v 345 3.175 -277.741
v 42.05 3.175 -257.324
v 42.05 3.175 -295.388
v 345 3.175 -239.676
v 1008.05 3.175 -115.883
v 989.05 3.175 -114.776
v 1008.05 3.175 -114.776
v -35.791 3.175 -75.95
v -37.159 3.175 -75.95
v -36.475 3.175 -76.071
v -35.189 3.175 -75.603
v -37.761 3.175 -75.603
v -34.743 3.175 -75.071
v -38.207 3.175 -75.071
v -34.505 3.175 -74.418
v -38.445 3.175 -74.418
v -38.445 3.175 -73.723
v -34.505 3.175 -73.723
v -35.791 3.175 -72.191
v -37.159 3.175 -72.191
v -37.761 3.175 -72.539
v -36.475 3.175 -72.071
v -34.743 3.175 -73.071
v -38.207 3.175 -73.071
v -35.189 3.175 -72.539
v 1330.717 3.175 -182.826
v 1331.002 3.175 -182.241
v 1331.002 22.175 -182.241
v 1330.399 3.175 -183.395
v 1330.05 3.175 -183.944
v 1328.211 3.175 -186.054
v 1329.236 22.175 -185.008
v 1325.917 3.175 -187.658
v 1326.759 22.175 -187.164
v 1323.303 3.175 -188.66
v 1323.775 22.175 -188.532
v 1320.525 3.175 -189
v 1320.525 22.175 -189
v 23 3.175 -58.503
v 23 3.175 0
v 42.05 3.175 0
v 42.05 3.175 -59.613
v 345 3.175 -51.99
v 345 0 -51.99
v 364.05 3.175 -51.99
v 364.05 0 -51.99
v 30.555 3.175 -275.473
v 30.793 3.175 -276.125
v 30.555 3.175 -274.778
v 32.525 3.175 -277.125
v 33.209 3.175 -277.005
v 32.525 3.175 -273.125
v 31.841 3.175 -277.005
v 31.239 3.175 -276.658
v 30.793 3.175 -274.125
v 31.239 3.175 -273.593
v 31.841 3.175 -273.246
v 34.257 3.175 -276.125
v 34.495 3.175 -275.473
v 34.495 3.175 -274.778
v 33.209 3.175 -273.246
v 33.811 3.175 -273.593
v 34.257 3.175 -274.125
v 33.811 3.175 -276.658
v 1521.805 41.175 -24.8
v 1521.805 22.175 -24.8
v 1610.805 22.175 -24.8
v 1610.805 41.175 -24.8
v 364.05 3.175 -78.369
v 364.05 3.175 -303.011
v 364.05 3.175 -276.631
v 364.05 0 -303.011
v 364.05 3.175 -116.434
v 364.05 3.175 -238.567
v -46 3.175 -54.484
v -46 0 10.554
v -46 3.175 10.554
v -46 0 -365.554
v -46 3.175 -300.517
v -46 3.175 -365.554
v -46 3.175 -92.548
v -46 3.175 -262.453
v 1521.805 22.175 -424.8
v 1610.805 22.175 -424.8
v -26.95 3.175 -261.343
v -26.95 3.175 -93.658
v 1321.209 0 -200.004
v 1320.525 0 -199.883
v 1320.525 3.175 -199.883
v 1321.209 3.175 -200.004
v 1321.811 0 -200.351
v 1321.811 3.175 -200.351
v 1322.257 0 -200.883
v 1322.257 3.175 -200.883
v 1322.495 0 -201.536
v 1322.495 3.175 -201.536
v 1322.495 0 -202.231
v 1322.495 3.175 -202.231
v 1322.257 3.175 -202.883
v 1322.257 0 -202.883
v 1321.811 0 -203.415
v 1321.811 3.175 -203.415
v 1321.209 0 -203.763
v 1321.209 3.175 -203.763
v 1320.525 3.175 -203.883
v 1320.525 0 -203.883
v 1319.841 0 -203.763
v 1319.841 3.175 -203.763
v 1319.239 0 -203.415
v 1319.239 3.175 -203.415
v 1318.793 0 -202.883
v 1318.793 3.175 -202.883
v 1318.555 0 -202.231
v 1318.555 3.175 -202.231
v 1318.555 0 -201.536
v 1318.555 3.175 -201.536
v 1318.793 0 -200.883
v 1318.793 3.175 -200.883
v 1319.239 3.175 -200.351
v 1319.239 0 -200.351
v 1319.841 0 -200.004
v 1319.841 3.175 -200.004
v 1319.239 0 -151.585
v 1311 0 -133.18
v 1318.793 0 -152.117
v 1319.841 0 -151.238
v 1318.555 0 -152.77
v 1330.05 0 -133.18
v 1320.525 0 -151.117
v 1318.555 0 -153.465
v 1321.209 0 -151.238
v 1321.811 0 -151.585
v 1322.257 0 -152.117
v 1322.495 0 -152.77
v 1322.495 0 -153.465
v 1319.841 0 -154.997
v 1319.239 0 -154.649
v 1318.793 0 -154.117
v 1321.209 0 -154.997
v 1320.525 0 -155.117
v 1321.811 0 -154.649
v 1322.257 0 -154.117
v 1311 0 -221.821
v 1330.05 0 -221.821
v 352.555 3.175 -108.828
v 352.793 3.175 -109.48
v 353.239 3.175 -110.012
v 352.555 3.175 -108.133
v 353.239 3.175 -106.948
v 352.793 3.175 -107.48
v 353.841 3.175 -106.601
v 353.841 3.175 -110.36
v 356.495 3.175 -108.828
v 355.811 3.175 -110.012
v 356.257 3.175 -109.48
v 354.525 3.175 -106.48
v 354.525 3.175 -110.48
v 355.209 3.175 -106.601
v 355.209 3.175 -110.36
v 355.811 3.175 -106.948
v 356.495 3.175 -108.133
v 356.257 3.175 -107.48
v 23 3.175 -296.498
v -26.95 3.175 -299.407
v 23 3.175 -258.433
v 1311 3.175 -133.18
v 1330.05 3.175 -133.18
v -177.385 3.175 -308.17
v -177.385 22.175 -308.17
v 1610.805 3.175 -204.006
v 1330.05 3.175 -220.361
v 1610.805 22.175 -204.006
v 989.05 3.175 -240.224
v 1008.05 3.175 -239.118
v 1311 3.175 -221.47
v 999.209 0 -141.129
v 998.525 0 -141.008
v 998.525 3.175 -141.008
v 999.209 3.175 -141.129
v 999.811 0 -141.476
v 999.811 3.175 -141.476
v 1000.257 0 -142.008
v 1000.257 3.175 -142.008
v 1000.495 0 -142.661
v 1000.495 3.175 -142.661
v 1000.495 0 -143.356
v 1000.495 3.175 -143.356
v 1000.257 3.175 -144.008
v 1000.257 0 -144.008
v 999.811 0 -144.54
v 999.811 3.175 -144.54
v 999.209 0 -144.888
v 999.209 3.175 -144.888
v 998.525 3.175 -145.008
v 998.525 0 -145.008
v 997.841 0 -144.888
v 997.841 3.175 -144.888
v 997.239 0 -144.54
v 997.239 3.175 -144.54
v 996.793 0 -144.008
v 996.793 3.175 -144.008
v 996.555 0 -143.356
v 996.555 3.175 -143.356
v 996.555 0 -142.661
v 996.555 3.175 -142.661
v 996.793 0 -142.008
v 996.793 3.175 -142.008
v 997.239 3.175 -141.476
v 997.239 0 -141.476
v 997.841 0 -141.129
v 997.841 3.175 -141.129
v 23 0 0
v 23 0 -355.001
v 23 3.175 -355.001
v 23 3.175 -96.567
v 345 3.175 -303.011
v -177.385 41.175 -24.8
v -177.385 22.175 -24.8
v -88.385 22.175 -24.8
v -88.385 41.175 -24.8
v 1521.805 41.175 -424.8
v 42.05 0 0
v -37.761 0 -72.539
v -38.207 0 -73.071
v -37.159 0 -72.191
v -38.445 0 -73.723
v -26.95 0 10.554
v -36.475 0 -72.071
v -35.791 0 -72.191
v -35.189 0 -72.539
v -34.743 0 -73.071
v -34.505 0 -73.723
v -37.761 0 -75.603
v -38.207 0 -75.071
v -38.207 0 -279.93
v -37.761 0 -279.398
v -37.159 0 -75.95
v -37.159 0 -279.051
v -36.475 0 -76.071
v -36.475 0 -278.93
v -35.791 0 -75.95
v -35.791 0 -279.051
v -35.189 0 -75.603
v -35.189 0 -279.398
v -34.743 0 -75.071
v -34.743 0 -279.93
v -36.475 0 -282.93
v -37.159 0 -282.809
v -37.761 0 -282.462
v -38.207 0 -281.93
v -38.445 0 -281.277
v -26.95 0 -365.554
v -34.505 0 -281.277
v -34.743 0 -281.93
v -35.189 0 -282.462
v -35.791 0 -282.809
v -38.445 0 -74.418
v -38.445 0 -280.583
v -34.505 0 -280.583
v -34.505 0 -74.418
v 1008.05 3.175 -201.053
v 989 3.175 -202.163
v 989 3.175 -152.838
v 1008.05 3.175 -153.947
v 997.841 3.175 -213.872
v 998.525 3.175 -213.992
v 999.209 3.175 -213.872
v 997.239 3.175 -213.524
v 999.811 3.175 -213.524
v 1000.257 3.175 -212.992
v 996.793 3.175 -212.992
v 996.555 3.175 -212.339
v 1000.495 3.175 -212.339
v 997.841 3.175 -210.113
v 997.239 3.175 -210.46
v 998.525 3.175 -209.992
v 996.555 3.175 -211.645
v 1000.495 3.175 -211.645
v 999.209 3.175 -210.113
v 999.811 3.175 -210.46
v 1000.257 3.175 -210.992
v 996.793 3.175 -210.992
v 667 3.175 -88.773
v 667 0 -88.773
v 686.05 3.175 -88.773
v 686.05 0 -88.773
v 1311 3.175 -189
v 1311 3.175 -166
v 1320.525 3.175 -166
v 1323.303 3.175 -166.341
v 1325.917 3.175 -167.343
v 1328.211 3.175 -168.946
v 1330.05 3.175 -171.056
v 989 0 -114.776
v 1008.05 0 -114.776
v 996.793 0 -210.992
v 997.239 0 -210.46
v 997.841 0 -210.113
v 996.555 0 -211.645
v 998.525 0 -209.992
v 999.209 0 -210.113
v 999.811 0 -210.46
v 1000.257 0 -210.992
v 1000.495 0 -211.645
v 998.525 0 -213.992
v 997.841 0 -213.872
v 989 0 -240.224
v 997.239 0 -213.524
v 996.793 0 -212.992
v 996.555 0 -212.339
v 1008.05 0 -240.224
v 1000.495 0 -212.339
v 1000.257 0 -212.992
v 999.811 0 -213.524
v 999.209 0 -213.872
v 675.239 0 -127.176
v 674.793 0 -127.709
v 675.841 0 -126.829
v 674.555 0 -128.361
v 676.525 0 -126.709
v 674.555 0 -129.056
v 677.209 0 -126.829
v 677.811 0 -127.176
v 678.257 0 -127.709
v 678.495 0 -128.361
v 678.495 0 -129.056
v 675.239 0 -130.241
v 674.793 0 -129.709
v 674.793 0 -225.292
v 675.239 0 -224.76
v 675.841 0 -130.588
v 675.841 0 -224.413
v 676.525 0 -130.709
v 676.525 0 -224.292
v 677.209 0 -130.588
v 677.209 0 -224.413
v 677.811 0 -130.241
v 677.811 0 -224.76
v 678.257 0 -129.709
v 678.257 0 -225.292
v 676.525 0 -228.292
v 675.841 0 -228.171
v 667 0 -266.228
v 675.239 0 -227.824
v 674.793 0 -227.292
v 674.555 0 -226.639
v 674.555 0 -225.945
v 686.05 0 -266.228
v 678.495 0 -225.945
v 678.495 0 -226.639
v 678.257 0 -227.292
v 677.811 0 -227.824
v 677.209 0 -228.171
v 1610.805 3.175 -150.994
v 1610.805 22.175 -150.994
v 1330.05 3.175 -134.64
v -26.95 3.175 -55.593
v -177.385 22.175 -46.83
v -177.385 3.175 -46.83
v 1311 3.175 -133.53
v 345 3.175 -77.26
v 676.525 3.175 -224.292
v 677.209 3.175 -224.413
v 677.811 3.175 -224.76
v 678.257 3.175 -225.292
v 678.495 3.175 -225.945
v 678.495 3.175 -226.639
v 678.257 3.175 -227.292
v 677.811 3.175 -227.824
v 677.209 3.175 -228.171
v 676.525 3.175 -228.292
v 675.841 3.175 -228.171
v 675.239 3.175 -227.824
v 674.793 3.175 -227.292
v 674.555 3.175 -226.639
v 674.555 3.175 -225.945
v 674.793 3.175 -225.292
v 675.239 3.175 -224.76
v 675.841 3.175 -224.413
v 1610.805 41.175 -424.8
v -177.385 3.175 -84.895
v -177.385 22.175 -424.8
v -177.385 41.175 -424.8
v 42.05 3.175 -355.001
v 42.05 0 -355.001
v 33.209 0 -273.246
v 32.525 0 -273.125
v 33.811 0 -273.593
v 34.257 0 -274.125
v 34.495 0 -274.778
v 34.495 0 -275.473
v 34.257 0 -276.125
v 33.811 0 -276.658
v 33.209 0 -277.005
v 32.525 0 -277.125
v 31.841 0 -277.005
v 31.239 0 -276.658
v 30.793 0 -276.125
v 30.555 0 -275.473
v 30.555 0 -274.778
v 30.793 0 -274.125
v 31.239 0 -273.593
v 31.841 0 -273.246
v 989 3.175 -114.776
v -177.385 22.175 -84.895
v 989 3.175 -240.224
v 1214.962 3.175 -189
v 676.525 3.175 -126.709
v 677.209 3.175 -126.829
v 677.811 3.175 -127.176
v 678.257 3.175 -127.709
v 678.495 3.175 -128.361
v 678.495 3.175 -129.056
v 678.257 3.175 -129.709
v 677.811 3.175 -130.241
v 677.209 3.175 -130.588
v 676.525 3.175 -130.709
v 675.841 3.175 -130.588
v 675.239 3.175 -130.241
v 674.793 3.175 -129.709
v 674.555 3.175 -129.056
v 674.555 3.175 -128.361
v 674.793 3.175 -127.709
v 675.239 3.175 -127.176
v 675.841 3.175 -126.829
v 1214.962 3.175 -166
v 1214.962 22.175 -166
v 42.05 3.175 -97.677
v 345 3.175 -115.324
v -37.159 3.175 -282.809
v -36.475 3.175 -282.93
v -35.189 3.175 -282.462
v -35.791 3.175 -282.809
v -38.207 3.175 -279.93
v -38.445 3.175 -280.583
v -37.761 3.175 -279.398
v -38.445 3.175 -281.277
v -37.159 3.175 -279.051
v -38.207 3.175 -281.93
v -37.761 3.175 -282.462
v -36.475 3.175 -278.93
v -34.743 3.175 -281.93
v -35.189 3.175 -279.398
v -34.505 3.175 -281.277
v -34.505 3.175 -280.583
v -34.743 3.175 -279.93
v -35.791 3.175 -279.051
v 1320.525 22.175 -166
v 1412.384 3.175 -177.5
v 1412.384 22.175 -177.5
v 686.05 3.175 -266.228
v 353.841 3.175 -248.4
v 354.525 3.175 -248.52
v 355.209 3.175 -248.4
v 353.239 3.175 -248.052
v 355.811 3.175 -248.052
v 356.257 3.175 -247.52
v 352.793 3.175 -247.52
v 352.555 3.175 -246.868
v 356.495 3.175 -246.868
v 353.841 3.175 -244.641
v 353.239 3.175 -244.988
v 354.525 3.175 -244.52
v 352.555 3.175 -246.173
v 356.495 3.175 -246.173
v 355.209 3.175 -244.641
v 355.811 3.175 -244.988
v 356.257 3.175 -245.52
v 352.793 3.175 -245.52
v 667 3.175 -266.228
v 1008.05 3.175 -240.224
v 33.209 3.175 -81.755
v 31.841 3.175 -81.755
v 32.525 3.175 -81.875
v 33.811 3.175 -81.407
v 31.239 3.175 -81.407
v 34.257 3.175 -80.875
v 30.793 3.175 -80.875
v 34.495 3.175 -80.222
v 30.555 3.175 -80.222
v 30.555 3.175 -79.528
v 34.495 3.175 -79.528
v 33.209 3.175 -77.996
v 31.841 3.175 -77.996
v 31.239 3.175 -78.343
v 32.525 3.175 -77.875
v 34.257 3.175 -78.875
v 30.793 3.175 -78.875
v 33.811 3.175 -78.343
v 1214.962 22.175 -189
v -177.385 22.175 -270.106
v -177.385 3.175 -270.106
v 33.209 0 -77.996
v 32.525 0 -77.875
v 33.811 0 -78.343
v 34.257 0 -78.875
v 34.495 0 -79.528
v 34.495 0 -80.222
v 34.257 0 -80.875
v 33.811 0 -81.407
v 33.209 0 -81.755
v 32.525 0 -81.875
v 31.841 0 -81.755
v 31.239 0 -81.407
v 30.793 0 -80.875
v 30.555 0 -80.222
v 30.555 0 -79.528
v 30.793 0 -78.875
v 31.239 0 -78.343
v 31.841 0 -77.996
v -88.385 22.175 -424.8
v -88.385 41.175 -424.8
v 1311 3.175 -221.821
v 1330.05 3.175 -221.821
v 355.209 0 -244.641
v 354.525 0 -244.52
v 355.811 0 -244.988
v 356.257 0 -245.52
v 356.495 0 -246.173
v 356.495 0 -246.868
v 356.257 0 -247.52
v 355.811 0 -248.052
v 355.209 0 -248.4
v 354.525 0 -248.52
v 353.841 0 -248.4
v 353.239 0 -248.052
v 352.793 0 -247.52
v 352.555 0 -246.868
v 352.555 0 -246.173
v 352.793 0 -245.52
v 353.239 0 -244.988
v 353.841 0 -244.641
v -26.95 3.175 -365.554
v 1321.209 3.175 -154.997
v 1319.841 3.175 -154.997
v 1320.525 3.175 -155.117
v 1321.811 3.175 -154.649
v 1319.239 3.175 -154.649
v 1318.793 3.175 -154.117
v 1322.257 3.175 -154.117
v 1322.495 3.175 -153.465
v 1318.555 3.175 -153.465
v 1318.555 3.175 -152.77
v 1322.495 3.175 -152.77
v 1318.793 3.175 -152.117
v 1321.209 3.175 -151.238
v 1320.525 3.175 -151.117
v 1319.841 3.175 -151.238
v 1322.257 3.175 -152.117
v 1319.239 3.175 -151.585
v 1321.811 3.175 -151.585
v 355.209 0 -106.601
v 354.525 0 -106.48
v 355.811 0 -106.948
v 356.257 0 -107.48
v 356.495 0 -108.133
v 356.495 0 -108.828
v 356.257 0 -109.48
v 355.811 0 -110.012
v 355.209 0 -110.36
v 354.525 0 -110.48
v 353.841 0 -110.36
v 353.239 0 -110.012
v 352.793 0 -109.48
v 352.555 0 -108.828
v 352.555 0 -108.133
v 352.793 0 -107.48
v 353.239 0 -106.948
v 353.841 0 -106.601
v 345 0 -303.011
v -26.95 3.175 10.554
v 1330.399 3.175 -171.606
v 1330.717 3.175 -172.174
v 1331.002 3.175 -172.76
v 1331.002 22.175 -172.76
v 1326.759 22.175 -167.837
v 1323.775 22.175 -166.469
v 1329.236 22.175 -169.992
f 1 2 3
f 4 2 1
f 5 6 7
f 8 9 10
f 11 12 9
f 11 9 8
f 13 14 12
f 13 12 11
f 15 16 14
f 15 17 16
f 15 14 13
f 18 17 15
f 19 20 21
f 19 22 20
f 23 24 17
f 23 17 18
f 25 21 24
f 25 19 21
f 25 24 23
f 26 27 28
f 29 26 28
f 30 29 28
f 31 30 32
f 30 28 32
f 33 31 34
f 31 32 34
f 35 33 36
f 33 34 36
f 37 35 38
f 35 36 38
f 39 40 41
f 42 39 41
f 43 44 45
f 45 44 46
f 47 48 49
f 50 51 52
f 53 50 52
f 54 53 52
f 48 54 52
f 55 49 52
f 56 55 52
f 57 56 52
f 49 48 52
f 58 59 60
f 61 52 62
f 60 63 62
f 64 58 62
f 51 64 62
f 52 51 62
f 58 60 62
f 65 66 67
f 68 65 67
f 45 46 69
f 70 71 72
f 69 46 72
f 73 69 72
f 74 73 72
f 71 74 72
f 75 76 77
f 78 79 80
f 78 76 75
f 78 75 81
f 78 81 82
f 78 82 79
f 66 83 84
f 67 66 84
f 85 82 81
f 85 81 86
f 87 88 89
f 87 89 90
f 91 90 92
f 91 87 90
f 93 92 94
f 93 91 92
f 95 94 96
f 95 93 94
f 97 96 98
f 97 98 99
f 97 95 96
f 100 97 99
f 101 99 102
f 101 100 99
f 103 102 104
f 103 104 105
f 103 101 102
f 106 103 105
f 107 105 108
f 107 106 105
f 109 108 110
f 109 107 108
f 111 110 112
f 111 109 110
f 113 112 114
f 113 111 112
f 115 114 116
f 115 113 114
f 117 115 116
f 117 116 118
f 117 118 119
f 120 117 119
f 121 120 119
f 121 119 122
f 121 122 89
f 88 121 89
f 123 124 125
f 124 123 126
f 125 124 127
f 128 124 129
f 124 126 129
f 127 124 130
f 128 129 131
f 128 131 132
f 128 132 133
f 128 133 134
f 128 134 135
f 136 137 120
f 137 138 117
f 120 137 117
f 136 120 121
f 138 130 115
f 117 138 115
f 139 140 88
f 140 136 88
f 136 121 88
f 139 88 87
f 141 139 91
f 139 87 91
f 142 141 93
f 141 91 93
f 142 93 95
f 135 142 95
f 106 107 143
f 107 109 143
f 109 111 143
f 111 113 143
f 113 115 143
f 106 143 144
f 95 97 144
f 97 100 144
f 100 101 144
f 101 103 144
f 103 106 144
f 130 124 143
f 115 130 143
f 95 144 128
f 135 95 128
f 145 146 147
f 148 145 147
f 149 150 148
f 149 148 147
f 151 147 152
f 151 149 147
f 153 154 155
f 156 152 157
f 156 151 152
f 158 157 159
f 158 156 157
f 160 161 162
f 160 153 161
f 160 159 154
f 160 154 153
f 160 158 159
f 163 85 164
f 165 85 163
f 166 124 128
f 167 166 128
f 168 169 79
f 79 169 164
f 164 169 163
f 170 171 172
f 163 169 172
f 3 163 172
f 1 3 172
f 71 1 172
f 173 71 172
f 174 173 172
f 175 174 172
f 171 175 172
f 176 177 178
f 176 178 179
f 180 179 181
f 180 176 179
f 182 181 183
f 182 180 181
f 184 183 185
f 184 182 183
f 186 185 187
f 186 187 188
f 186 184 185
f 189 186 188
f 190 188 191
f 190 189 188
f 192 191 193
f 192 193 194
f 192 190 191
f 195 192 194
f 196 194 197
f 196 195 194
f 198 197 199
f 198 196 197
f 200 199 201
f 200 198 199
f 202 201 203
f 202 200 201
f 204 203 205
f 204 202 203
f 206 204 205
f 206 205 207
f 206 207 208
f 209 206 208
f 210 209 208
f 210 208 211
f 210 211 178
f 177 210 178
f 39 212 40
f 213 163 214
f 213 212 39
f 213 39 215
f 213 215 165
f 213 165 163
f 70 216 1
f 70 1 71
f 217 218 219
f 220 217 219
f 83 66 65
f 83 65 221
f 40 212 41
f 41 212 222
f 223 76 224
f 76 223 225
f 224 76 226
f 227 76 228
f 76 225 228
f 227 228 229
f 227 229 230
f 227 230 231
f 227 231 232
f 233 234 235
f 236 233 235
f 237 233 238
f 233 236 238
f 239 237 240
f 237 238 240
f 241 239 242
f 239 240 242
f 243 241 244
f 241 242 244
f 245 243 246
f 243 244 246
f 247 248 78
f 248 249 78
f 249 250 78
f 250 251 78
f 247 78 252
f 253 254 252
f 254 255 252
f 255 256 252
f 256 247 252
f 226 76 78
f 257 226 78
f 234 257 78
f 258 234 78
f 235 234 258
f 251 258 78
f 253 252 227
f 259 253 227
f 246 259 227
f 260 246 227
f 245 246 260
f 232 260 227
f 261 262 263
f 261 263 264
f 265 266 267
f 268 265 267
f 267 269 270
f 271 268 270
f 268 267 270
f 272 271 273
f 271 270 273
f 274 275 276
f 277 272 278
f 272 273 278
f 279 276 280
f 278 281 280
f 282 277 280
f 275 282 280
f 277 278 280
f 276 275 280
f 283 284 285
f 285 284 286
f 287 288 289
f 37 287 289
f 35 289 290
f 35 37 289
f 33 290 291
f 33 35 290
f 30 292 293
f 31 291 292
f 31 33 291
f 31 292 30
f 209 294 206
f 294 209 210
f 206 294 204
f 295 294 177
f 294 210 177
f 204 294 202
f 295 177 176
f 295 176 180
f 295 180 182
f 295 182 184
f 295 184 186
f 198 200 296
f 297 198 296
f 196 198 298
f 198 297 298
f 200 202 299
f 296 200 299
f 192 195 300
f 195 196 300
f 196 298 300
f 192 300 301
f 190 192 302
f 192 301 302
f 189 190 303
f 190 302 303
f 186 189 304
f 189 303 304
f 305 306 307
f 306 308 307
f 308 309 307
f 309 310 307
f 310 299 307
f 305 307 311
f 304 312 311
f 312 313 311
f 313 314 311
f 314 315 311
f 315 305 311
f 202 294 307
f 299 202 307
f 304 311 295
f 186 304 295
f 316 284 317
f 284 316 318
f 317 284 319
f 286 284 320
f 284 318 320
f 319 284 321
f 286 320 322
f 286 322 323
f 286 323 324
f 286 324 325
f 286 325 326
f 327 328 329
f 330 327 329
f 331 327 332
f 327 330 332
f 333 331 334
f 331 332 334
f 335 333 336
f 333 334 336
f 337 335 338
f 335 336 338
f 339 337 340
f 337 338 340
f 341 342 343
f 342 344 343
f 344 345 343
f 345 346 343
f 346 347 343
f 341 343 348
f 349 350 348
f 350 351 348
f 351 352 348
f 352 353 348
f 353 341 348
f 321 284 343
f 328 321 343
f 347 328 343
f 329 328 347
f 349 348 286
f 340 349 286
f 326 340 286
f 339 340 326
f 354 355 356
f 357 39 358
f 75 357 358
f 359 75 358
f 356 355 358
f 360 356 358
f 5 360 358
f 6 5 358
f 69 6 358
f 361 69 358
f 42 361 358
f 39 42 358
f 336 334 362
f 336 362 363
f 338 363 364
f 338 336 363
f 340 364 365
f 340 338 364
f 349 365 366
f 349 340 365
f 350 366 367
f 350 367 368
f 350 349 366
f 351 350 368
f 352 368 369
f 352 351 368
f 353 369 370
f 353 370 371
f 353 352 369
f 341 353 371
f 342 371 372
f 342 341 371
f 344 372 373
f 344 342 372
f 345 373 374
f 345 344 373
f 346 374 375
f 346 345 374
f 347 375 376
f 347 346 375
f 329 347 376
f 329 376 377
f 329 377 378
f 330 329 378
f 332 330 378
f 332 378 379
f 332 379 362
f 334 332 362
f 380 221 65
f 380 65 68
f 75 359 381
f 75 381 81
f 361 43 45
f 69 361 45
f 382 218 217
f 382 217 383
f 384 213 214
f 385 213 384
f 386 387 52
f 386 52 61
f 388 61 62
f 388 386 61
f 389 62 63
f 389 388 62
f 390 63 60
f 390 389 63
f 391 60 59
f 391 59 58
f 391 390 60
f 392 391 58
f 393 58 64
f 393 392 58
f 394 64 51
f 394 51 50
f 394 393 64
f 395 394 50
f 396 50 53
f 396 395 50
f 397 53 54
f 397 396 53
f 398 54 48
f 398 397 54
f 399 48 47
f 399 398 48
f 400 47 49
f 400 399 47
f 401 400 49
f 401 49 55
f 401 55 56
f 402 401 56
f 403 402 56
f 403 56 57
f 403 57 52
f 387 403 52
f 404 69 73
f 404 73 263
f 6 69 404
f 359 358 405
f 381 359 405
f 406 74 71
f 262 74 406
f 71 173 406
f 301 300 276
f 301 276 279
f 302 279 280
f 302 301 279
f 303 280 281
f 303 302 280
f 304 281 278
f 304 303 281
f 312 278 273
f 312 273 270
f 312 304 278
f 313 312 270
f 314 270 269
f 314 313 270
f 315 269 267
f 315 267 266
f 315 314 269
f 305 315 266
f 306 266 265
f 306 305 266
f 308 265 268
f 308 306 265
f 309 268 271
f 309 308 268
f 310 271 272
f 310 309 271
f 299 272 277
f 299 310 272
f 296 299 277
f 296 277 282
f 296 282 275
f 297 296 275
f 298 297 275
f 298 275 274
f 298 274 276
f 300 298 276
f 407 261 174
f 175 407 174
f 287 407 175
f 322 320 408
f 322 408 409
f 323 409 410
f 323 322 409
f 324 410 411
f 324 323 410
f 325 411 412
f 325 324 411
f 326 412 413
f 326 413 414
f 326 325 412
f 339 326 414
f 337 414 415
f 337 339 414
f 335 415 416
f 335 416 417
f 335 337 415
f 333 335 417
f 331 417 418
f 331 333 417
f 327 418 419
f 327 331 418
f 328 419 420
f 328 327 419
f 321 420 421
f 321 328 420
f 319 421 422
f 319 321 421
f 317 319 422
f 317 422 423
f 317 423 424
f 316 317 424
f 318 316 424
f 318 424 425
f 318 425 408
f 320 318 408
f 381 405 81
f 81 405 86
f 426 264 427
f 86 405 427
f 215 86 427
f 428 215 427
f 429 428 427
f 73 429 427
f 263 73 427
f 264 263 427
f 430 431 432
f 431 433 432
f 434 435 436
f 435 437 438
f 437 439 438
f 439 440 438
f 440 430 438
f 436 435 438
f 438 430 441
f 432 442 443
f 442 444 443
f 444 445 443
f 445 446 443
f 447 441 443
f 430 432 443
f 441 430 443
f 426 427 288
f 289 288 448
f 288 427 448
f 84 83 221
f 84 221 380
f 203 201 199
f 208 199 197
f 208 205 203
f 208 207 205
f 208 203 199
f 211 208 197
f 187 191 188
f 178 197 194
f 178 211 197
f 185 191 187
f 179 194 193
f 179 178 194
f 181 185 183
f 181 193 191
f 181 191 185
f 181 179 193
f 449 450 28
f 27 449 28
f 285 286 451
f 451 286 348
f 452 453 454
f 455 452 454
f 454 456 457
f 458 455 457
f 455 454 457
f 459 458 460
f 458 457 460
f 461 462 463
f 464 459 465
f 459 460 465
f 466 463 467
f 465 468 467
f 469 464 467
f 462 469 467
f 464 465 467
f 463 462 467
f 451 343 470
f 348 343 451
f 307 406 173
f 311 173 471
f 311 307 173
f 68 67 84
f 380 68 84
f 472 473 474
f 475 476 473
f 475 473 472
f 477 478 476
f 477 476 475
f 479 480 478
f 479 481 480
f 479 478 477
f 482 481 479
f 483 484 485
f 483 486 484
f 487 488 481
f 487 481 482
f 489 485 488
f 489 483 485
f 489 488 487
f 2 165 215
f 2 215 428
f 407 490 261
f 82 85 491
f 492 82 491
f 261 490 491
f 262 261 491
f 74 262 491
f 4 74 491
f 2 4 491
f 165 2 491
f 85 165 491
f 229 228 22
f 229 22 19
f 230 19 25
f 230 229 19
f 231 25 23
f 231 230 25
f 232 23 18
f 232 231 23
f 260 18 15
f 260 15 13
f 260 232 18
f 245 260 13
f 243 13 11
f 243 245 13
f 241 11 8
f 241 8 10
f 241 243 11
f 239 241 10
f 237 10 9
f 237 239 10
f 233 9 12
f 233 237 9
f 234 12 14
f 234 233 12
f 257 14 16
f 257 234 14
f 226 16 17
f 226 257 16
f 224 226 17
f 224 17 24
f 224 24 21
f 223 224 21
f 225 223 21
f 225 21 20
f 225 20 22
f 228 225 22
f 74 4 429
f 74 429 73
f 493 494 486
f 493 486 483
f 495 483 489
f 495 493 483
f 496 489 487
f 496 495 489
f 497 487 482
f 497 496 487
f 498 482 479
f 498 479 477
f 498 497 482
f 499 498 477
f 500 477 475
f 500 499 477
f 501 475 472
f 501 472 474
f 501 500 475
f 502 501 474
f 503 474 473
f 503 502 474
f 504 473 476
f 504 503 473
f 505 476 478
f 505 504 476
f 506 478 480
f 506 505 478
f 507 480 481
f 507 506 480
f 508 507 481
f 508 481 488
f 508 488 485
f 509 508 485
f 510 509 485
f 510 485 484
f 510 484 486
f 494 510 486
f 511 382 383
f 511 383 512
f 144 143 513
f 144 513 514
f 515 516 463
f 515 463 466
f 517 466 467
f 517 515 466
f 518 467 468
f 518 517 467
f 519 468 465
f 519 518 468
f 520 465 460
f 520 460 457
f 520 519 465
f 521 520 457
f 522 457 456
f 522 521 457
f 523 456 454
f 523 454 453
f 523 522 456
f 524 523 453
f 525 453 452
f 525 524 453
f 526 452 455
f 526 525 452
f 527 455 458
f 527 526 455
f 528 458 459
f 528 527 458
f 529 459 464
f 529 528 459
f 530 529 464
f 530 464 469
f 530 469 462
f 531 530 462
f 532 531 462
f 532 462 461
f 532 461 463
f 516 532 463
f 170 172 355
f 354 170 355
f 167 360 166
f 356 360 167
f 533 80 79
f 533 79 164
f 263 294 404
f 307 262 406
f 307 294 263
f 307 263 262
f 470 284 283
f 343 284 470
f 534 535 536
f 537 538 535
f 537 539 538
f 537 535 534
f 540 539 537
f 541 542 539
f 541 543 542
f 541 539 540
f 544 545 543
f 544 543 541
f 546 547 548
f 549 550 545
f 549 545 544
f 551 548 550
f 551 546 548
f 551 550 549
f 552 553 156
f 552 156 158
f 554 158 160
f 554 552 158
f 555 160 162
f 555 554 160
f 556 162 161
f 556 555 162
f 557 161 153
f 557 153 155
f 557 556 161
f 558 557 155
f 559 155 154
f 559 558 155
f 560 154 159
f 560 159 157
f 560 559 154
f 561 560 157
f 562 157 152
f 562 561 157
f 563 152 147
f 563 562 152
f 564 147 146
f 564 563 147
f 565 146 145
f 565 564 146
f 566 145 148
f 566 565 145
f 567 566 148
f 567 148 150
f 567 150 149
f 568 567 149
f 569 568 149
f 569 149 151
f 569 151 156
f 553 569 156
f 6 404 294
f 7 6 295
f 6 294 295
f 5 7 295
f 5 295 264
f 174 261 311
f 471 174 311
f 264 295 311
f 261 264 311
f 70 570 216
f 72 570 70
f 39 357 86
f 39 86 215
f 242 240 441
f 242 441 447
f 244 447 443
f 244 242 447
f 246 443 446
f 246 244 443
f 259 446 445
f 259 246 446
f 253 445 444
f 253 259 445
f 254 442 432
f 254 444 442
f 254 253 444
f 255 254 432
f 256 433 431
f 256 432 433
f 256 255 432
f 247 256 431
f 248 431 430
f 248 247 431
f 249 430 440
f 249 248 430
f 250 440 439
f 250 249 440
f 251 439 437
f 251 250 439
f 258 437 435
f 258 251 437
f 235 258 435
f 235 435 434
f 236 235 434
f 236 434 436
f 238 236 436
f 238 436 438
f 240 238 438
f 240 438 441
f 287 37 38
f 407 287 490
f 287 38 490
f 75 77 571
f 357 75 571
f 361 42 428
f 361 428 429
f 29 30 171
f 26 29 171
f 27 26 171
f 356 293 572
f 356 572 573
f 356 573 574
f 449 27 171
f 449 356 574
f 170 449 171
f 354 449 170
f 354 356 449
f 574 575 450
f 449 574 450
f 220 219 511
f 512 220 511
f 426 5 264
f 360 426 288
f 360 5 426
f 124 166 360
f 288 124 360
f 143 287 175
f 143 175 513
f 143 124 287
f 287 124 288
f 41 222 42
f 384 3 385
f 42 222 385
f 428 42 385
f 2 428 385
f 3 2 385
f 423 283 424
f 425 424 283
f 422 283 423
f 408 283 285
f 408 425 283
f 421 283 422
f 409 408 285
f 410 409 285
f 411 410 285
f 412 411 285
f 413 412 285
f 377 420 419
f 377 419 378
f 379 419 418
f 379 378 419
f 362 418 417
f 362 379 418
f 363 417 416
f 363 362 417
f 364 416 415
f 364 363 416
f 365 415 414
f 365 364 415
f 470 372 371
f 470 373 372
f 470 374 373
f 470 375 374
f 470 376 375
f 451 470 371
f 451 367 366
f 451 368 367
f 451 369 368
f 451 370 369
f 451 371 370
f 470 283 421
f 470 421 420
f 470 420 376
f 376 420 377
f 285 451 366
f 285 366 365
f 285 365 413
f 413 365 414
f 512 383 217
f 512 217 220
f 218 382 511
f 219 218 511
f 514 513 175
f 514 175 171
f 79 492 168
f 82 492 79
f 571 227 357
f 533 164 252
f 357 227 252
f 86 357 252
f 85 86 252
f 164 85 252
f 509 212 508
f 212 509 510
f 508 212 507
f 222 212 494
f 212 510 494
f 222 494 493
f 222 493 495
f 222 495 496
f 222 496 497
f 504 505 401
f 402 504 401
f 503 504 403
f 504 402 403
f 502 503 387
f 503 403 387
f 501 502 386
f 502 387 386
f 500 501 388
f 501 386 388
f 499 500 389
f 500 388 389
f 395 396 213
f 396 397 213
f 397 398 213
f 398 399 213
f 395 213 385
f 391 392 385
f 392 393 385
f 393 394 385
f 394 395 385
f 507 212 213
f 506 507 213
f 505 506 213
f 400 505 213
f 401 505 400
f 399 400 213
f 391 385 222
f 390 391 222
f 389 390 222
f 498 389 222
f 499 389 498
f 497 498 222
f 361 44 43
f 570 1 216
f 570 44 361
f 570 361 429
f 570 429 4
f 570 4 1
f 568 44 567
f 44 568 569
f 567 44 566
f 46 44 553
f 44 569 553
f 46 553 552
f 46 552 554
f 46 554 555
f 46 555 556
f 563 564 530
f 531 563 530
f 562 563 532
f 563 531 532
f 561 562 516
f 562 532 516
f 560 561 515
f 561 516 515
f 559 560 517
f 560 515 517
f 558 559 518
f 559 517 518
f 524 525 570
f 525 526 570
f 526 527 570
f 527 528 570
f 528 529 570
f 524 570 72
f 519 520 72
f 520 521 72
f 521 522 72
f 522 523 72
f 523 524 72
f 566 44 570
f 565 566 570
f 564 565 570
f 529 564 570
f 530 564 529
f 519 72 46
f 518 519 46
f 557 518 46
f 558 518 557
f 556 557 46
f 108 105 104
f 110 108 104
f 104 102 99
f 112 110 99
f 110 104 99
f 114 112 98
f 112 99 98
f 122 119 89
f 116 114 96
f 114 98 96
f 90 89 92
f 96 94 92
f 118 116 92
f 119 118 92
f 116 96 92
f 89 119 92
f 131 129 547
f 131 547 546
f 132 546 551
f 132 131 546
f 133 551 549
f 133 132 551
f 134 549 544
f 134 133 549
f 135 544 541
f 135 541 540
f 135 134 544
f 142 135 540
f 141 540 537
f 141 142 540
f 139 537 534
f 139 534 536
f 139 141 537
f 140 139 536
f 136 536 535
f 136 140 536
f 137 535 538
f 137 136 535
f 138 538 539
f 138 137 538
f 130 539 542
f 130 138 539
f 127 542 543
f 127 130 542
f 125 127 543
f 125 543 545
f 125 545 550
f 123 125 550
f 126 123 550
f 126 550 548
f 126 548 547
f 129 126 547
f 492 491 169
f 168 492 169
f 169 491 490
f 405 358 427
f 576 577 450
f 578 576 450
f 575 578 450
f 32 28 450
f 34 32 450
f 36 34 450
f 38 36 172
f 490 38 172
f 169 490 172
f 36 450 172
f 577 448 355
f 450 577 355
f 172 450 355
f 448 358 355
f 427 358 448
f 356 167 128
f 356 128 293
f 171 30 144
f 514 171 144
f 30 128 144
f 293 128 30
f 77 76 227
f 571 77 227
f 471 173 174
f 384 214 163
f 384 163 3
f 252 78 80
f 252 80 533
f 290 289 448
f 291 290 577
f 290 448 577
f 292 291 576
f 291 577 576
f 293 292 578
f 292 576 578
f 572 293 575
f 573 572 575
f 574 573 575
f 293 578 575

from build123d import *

# Parameters (mm, degrees)
SKETCH2_W             = 19.05
SKETCH2_H             = 355.00056
SKETCH2_R             = 2
BOSS_EXTRUDE1_DEPTH   = 3.175
SKETCH2_H_2           = 251.02058
BOSS_EXTRUDE1_2_DEPTH = 3.175
SKETCH2_H_3           = 177.45456
BOSS_EXTRUDE1_3_DEPTH = 3.175
SKETCH2_H_4           = 125.44806
BOSS_EXTRUDE1_4_DEPTH = 3.175
SKETCH2_H_5           = 88.64092
BOSS_EXTRUDE1_5_DEPTH = 3.175
SKETCH2_H_6           = 376.10796
BOSS_EXTRUDE1_6_DEPTH = 3.175
SKETCH3_W             = 1788.19
SKETCH3_H             = 140
BOSS_EXTRUDE2_DEPTH   = 19
BOSS_EXTRUDE2_2_DEPTH = 19
SKETCH4_R             = 2
BOSS_EXTRUDE3_DEPTH   = 19
SKETCH5_W             = 89
SKETCH5_H             = 400
BOSS_EXTRUDE4_DEPTH   = 19
BOSS_EXTRUDE4_2_DEPTH = 19
BOSS_EXTRUDE5_START   = -19
SKETCH6_R             = 2
BOSS_EXTRUDE5_DEPTH   = 19
CUT_EXTRUDE1_DEPTH    = 19


with BuildPart() as part:
    # Sketch2 → Boss-Extrude1 (new body)
    with BuildSketch(Plane(origin=(0, 0, 0), x_dir=(1, 0, 0), z_dir=(0, 1, 0))):
        with Locations((32.525, 177.50028)):
            Rectangle(SKETCH2_W, SKETCH2_H)
        with Locations((32.525, 79.875126)):
            Circle(SKETCH2_R, mode=Mode.SUBTRACT)
        with Locations((32.525, 275.125434)):
            Circle(SKETCH2_R, mode=Mode.SUBTRACT)
    extrude(amount=BOSS_EXTRUDE1_DEPTH)



with BuildPart() as body_2:
    # Sketch2 → Boss-Extrude1 2 (new body)
    with BuildSketch(Plane(origin=(0, 0, 0), x_dir=(1, 0, 0), z_dir=(0, 1, 0))):
        with Locations((354.525, 177.50028)):
            Rectangle(SKETCH2_W, SKETCH2_H_2)
        with Locations((354.525, 108.48022915)):
            Circle(SKETCH2_R, mode=Mode.SUBTRACT)
        with Locations((354.525, 246.52033085)):
            Circle(SKETCH2_R, mode=Mode.SUBTRACT)
    extrude(amount=BOSS_EXTRUDE1_2_DEPTH)


with BuildPart() as body_3:
    # Sketch2 → Boss-Extrude1 3 (new body)
    with BuildSketch(Plane(origin=(0, 0, 0), x_dir=(1, 0, 0), z_dir=(0, 1, 0))):
        with Locations((676.525, 177.50028)):
            Rectangle(SKETCH2_W, SKETCH2_H_3)
        with Locations((676.525, 128.708539125)):
            Circle(SKETCH2_R, mode=Mode.SUBTRACT)
        with Locations((676.525, 226.292020875)):
            Circle(SKETCH2_R, mode=Mode.SUBTRACT)
    extrude(amount=BOSS_EXTRUDE1_3_DEPTH)


with BuildPart() as body_4:
    # Sketch2 → Boss-Extrude1 4 (new body)
    with BuildSketch(Plane(origin=(0, 0, 0), x_dir=(1, 0, 0), z_dir=(0, 1, 0))):
        with Locations((998.525, 177.50028)):
            Rectangle(SKETCH2_W, SKETCH2_H_4)
        with Locations((998.525, 143.008361365)):
            Circle(SKETCH2_R, mode=Mode.SUBTRACT)
        with Locations((998.525, 211.992198635)):
            Circle(SKETCH2_R, mode=Mode.SUBTRACT)
    extrude(amount=BOSS_EXTRUDE1_4_DEPTH)


with BuildPart() as body_5:
    # Sketch2 → Boss-Extrude1 5 (new body)
    with BuildSketch(Plane(origin=(0, 0, 0), x_dir=(1, 0, 0), z_dir=(0, 1, 0))):
        with Locations((1320.525, 177.50028)):
            Rectangle(SKETCH2_W, SKETCH2_H_5)
        with Locations((1320.525, 153.11720963)):
            Circle(SKETCH2_R, mode=Mode.SUBTRACT)
        with Locations((1320.525, 201.88335037)):
            Circle(SKETCH2_R, mode=Mode.SUBTRACT)
    extrude(amount=BOSS_EXTRUDE1_5_DEPTH)


with BuildPart() as body_6:
    # Sketch2 → Boss-Extrude1 6 (new body)
    with BuildSketch(Plane(origin=(0, 0, 0), x_dir=(1, 0, 0), z_dir=(0, 1, 0))):
        with Locations((-36.475, 177.50028)):
            Rectangle(SKETCH2_W, SKETCH2_H_6)
        with Locations((-36.475, 74.070591)):
            Circle(SKETCH2_R, mode=Mode.SUBTRACT)
        with Locations((-36.475, 280.929969)):
            Circle(SKETCH2_R, mode=Mode.SUBTRACT)
    extrude(amount=BOSS_EXTRUDE1_6_DEPTH)


with BuildPart() as body_7:
    # Sketch3 → Boss-Extrude2 (new body)
    with BuildSketch(Plane(origin=(0, 3.175, 0), x_dir=(1, 0, 0), z_dir=(0, 1, 0))):
        with Locations((716.71, 260.20028)):
            Rectangle(SKETCH3_W, SKETCH3_H)
    extrude(amount=BOSS_EXTRUDE2_DEPTH)


with BuildPart() as body_8:
    # Sketch3 → Boss-Extrude2 2 (new body)
    with BuildSketch(Plane(origin=(0, 3.175, 0), x_dir=(1, 0, 0), z_dir=(0, 1, 0))):
        with Locations((716.71, 94.80028)):
            Rectangle(SKETCH3_W, SKETCH3_H)
    extrude(amount=BOSS_EXTRUDE2_2_DEPTH)


with BuildPart() as body_9:
    # Sketch4 → Boss-Extrude3 (new body)
    with BuildSketch(Plane.XZ.offset(-3.175)):
        Polygon((-177.385, -270.105910706), (-177.385, -308.170326529), (1610.805, -204.006455514), (1610.805, -150.994104486), (-177.385, -46.830233471), (-177.385, -84.894649294), (1412.383709231, -177.50028), align=None)
        with Locations((-36.475, -280.929969)):
            Circle(SKETCH4_R, mode=Mode.SUBTRACT)
        with BuildLine():
            ThreePointArc((33.534728126, -276.851831727), (32.641304863, -277.122049431), (31.722549739, -276.957392946))
            ThreePointArc((31.722549739, -276.957392946), (32.408695137, -273.128818569), (33.534728126, -276.851831727))
        make_face(mode=Mode.SUBTRACT)
        with Locations((354.525, -246.52033085)):
            Circle(SKETCH4_R, mode=Mode.SUBTRACT)
        with Locations((998.525, -211.992198635)):
            Circle(SKETCH4_R, mode=Mode.SUBTRACT)
        with Locations((1320.525, -201.88335037)):
            Circle(SKETCH4_R, mode=Mode.SUBTRACT)
    extrude(amount=-BOSS_EXTRUDE3_DEPTH)


with BuildPart() as body_10:
    # Sketch5 → Boss-Extrude4 (new body)
    with BuildSketch(Plane(origin=(0, 22.175, 0), x_dir=(1, 0, 0), z_dir=(0, 1, 0))):
        with Locations((1566.305, 224.80028)):
            Rectangle(SKETCH5_W, SKETCH5_H)
    extrude(amount=BOSS_EXTRUDE4_DEPTH)


with BuildPart() as body_11:
    # Sketch5 → Boss-Extrude4 2 (new body)
    with BuildSketch(Plane(origin=(0, 22.175, 0), x_dir=(1, 0, 0), z_dir=(0, 1, 0))):
        with Locations((-132.885, 224.80028)):
            Rectangle(SKETCH5_W, SKETCH5_H)
    extrude(amount=BOSS_EXTRUDE4_2_DEPTH)


with BuildPart() as part_1:
    add(part.part)

    add(body_2.part)  # Boss-Extrude5 merges body 2

    add(body_4.part)  # Boss-Extrude5 merges body 4

    add(body_5.part)  # Boss-Extrude5 merges body 5

    add(body_6.part)  # Boss-Extrude5 merges body 6

    add(body_9.part)  # Boss-Extrude5 merges body 9
    # Sketch6 → Boss-Extrude5 (add)
    with BuildSketch(Plane(origin=(0, 22.175, 0), x_dir=(1, 0, 0), z_dir=(0, 1, 0)).offset(BOSS_EXTRUDE5_START)):
        with Locations((-36.475, 280.929969)):
            Circle(SKETCH6_R)
        with Locations((354.525, 246.52033085)):
            Circle(SKETCH6_R)
        with Locations((998.525, 211.992198635)):
            Circle(SKETCH6_R)
        with Locations((1320.525, 201.88335037)):
            Circle(SKETCH6_R)
        with Locations((32.525, 275.125434)):
            Circle(SKETCH6_R)
    extrude(amount=BOSS_EXTRUDE5_DEPTH)

    # Sketch7 → Cut-Extrude1 (cut)
    with BuildSketch(Plane(origin=(0, 22.175, 0), x_dir=(1, 0, 0), z_dir=(0, 1, 0))):
        with BuildLine():
            Line((1214.962234784, 166.00028), (1320.525, 166.00028))
            ThreePointArc((1320.525, 166.00028), (1326.759332182, 167.836786727), (1331.002465583, 172.759740479))
            Line((1331.002465583, 172.759740479), (1214.962234784, 166.00028))
        make_face()
        with BuildLine():
            ThreePointArc((1331.002465583, 182.240819521), (1326.759332182, 187.163773273), (1320.525, 189.00028))
            Line((1320.525, 189.00028), (1214.962234784, 189.00028))
            Line((1214.962234784, 189.00028), (1331.002465583, 182.240819521))
        make_face()
    extrude(amount=-CUT_EXTRUDE1_DEPTH, mode=Mode.SUBTRACT)


solid = Compound([body_3.part, body_10.part, body_11.part, part_1.part])
